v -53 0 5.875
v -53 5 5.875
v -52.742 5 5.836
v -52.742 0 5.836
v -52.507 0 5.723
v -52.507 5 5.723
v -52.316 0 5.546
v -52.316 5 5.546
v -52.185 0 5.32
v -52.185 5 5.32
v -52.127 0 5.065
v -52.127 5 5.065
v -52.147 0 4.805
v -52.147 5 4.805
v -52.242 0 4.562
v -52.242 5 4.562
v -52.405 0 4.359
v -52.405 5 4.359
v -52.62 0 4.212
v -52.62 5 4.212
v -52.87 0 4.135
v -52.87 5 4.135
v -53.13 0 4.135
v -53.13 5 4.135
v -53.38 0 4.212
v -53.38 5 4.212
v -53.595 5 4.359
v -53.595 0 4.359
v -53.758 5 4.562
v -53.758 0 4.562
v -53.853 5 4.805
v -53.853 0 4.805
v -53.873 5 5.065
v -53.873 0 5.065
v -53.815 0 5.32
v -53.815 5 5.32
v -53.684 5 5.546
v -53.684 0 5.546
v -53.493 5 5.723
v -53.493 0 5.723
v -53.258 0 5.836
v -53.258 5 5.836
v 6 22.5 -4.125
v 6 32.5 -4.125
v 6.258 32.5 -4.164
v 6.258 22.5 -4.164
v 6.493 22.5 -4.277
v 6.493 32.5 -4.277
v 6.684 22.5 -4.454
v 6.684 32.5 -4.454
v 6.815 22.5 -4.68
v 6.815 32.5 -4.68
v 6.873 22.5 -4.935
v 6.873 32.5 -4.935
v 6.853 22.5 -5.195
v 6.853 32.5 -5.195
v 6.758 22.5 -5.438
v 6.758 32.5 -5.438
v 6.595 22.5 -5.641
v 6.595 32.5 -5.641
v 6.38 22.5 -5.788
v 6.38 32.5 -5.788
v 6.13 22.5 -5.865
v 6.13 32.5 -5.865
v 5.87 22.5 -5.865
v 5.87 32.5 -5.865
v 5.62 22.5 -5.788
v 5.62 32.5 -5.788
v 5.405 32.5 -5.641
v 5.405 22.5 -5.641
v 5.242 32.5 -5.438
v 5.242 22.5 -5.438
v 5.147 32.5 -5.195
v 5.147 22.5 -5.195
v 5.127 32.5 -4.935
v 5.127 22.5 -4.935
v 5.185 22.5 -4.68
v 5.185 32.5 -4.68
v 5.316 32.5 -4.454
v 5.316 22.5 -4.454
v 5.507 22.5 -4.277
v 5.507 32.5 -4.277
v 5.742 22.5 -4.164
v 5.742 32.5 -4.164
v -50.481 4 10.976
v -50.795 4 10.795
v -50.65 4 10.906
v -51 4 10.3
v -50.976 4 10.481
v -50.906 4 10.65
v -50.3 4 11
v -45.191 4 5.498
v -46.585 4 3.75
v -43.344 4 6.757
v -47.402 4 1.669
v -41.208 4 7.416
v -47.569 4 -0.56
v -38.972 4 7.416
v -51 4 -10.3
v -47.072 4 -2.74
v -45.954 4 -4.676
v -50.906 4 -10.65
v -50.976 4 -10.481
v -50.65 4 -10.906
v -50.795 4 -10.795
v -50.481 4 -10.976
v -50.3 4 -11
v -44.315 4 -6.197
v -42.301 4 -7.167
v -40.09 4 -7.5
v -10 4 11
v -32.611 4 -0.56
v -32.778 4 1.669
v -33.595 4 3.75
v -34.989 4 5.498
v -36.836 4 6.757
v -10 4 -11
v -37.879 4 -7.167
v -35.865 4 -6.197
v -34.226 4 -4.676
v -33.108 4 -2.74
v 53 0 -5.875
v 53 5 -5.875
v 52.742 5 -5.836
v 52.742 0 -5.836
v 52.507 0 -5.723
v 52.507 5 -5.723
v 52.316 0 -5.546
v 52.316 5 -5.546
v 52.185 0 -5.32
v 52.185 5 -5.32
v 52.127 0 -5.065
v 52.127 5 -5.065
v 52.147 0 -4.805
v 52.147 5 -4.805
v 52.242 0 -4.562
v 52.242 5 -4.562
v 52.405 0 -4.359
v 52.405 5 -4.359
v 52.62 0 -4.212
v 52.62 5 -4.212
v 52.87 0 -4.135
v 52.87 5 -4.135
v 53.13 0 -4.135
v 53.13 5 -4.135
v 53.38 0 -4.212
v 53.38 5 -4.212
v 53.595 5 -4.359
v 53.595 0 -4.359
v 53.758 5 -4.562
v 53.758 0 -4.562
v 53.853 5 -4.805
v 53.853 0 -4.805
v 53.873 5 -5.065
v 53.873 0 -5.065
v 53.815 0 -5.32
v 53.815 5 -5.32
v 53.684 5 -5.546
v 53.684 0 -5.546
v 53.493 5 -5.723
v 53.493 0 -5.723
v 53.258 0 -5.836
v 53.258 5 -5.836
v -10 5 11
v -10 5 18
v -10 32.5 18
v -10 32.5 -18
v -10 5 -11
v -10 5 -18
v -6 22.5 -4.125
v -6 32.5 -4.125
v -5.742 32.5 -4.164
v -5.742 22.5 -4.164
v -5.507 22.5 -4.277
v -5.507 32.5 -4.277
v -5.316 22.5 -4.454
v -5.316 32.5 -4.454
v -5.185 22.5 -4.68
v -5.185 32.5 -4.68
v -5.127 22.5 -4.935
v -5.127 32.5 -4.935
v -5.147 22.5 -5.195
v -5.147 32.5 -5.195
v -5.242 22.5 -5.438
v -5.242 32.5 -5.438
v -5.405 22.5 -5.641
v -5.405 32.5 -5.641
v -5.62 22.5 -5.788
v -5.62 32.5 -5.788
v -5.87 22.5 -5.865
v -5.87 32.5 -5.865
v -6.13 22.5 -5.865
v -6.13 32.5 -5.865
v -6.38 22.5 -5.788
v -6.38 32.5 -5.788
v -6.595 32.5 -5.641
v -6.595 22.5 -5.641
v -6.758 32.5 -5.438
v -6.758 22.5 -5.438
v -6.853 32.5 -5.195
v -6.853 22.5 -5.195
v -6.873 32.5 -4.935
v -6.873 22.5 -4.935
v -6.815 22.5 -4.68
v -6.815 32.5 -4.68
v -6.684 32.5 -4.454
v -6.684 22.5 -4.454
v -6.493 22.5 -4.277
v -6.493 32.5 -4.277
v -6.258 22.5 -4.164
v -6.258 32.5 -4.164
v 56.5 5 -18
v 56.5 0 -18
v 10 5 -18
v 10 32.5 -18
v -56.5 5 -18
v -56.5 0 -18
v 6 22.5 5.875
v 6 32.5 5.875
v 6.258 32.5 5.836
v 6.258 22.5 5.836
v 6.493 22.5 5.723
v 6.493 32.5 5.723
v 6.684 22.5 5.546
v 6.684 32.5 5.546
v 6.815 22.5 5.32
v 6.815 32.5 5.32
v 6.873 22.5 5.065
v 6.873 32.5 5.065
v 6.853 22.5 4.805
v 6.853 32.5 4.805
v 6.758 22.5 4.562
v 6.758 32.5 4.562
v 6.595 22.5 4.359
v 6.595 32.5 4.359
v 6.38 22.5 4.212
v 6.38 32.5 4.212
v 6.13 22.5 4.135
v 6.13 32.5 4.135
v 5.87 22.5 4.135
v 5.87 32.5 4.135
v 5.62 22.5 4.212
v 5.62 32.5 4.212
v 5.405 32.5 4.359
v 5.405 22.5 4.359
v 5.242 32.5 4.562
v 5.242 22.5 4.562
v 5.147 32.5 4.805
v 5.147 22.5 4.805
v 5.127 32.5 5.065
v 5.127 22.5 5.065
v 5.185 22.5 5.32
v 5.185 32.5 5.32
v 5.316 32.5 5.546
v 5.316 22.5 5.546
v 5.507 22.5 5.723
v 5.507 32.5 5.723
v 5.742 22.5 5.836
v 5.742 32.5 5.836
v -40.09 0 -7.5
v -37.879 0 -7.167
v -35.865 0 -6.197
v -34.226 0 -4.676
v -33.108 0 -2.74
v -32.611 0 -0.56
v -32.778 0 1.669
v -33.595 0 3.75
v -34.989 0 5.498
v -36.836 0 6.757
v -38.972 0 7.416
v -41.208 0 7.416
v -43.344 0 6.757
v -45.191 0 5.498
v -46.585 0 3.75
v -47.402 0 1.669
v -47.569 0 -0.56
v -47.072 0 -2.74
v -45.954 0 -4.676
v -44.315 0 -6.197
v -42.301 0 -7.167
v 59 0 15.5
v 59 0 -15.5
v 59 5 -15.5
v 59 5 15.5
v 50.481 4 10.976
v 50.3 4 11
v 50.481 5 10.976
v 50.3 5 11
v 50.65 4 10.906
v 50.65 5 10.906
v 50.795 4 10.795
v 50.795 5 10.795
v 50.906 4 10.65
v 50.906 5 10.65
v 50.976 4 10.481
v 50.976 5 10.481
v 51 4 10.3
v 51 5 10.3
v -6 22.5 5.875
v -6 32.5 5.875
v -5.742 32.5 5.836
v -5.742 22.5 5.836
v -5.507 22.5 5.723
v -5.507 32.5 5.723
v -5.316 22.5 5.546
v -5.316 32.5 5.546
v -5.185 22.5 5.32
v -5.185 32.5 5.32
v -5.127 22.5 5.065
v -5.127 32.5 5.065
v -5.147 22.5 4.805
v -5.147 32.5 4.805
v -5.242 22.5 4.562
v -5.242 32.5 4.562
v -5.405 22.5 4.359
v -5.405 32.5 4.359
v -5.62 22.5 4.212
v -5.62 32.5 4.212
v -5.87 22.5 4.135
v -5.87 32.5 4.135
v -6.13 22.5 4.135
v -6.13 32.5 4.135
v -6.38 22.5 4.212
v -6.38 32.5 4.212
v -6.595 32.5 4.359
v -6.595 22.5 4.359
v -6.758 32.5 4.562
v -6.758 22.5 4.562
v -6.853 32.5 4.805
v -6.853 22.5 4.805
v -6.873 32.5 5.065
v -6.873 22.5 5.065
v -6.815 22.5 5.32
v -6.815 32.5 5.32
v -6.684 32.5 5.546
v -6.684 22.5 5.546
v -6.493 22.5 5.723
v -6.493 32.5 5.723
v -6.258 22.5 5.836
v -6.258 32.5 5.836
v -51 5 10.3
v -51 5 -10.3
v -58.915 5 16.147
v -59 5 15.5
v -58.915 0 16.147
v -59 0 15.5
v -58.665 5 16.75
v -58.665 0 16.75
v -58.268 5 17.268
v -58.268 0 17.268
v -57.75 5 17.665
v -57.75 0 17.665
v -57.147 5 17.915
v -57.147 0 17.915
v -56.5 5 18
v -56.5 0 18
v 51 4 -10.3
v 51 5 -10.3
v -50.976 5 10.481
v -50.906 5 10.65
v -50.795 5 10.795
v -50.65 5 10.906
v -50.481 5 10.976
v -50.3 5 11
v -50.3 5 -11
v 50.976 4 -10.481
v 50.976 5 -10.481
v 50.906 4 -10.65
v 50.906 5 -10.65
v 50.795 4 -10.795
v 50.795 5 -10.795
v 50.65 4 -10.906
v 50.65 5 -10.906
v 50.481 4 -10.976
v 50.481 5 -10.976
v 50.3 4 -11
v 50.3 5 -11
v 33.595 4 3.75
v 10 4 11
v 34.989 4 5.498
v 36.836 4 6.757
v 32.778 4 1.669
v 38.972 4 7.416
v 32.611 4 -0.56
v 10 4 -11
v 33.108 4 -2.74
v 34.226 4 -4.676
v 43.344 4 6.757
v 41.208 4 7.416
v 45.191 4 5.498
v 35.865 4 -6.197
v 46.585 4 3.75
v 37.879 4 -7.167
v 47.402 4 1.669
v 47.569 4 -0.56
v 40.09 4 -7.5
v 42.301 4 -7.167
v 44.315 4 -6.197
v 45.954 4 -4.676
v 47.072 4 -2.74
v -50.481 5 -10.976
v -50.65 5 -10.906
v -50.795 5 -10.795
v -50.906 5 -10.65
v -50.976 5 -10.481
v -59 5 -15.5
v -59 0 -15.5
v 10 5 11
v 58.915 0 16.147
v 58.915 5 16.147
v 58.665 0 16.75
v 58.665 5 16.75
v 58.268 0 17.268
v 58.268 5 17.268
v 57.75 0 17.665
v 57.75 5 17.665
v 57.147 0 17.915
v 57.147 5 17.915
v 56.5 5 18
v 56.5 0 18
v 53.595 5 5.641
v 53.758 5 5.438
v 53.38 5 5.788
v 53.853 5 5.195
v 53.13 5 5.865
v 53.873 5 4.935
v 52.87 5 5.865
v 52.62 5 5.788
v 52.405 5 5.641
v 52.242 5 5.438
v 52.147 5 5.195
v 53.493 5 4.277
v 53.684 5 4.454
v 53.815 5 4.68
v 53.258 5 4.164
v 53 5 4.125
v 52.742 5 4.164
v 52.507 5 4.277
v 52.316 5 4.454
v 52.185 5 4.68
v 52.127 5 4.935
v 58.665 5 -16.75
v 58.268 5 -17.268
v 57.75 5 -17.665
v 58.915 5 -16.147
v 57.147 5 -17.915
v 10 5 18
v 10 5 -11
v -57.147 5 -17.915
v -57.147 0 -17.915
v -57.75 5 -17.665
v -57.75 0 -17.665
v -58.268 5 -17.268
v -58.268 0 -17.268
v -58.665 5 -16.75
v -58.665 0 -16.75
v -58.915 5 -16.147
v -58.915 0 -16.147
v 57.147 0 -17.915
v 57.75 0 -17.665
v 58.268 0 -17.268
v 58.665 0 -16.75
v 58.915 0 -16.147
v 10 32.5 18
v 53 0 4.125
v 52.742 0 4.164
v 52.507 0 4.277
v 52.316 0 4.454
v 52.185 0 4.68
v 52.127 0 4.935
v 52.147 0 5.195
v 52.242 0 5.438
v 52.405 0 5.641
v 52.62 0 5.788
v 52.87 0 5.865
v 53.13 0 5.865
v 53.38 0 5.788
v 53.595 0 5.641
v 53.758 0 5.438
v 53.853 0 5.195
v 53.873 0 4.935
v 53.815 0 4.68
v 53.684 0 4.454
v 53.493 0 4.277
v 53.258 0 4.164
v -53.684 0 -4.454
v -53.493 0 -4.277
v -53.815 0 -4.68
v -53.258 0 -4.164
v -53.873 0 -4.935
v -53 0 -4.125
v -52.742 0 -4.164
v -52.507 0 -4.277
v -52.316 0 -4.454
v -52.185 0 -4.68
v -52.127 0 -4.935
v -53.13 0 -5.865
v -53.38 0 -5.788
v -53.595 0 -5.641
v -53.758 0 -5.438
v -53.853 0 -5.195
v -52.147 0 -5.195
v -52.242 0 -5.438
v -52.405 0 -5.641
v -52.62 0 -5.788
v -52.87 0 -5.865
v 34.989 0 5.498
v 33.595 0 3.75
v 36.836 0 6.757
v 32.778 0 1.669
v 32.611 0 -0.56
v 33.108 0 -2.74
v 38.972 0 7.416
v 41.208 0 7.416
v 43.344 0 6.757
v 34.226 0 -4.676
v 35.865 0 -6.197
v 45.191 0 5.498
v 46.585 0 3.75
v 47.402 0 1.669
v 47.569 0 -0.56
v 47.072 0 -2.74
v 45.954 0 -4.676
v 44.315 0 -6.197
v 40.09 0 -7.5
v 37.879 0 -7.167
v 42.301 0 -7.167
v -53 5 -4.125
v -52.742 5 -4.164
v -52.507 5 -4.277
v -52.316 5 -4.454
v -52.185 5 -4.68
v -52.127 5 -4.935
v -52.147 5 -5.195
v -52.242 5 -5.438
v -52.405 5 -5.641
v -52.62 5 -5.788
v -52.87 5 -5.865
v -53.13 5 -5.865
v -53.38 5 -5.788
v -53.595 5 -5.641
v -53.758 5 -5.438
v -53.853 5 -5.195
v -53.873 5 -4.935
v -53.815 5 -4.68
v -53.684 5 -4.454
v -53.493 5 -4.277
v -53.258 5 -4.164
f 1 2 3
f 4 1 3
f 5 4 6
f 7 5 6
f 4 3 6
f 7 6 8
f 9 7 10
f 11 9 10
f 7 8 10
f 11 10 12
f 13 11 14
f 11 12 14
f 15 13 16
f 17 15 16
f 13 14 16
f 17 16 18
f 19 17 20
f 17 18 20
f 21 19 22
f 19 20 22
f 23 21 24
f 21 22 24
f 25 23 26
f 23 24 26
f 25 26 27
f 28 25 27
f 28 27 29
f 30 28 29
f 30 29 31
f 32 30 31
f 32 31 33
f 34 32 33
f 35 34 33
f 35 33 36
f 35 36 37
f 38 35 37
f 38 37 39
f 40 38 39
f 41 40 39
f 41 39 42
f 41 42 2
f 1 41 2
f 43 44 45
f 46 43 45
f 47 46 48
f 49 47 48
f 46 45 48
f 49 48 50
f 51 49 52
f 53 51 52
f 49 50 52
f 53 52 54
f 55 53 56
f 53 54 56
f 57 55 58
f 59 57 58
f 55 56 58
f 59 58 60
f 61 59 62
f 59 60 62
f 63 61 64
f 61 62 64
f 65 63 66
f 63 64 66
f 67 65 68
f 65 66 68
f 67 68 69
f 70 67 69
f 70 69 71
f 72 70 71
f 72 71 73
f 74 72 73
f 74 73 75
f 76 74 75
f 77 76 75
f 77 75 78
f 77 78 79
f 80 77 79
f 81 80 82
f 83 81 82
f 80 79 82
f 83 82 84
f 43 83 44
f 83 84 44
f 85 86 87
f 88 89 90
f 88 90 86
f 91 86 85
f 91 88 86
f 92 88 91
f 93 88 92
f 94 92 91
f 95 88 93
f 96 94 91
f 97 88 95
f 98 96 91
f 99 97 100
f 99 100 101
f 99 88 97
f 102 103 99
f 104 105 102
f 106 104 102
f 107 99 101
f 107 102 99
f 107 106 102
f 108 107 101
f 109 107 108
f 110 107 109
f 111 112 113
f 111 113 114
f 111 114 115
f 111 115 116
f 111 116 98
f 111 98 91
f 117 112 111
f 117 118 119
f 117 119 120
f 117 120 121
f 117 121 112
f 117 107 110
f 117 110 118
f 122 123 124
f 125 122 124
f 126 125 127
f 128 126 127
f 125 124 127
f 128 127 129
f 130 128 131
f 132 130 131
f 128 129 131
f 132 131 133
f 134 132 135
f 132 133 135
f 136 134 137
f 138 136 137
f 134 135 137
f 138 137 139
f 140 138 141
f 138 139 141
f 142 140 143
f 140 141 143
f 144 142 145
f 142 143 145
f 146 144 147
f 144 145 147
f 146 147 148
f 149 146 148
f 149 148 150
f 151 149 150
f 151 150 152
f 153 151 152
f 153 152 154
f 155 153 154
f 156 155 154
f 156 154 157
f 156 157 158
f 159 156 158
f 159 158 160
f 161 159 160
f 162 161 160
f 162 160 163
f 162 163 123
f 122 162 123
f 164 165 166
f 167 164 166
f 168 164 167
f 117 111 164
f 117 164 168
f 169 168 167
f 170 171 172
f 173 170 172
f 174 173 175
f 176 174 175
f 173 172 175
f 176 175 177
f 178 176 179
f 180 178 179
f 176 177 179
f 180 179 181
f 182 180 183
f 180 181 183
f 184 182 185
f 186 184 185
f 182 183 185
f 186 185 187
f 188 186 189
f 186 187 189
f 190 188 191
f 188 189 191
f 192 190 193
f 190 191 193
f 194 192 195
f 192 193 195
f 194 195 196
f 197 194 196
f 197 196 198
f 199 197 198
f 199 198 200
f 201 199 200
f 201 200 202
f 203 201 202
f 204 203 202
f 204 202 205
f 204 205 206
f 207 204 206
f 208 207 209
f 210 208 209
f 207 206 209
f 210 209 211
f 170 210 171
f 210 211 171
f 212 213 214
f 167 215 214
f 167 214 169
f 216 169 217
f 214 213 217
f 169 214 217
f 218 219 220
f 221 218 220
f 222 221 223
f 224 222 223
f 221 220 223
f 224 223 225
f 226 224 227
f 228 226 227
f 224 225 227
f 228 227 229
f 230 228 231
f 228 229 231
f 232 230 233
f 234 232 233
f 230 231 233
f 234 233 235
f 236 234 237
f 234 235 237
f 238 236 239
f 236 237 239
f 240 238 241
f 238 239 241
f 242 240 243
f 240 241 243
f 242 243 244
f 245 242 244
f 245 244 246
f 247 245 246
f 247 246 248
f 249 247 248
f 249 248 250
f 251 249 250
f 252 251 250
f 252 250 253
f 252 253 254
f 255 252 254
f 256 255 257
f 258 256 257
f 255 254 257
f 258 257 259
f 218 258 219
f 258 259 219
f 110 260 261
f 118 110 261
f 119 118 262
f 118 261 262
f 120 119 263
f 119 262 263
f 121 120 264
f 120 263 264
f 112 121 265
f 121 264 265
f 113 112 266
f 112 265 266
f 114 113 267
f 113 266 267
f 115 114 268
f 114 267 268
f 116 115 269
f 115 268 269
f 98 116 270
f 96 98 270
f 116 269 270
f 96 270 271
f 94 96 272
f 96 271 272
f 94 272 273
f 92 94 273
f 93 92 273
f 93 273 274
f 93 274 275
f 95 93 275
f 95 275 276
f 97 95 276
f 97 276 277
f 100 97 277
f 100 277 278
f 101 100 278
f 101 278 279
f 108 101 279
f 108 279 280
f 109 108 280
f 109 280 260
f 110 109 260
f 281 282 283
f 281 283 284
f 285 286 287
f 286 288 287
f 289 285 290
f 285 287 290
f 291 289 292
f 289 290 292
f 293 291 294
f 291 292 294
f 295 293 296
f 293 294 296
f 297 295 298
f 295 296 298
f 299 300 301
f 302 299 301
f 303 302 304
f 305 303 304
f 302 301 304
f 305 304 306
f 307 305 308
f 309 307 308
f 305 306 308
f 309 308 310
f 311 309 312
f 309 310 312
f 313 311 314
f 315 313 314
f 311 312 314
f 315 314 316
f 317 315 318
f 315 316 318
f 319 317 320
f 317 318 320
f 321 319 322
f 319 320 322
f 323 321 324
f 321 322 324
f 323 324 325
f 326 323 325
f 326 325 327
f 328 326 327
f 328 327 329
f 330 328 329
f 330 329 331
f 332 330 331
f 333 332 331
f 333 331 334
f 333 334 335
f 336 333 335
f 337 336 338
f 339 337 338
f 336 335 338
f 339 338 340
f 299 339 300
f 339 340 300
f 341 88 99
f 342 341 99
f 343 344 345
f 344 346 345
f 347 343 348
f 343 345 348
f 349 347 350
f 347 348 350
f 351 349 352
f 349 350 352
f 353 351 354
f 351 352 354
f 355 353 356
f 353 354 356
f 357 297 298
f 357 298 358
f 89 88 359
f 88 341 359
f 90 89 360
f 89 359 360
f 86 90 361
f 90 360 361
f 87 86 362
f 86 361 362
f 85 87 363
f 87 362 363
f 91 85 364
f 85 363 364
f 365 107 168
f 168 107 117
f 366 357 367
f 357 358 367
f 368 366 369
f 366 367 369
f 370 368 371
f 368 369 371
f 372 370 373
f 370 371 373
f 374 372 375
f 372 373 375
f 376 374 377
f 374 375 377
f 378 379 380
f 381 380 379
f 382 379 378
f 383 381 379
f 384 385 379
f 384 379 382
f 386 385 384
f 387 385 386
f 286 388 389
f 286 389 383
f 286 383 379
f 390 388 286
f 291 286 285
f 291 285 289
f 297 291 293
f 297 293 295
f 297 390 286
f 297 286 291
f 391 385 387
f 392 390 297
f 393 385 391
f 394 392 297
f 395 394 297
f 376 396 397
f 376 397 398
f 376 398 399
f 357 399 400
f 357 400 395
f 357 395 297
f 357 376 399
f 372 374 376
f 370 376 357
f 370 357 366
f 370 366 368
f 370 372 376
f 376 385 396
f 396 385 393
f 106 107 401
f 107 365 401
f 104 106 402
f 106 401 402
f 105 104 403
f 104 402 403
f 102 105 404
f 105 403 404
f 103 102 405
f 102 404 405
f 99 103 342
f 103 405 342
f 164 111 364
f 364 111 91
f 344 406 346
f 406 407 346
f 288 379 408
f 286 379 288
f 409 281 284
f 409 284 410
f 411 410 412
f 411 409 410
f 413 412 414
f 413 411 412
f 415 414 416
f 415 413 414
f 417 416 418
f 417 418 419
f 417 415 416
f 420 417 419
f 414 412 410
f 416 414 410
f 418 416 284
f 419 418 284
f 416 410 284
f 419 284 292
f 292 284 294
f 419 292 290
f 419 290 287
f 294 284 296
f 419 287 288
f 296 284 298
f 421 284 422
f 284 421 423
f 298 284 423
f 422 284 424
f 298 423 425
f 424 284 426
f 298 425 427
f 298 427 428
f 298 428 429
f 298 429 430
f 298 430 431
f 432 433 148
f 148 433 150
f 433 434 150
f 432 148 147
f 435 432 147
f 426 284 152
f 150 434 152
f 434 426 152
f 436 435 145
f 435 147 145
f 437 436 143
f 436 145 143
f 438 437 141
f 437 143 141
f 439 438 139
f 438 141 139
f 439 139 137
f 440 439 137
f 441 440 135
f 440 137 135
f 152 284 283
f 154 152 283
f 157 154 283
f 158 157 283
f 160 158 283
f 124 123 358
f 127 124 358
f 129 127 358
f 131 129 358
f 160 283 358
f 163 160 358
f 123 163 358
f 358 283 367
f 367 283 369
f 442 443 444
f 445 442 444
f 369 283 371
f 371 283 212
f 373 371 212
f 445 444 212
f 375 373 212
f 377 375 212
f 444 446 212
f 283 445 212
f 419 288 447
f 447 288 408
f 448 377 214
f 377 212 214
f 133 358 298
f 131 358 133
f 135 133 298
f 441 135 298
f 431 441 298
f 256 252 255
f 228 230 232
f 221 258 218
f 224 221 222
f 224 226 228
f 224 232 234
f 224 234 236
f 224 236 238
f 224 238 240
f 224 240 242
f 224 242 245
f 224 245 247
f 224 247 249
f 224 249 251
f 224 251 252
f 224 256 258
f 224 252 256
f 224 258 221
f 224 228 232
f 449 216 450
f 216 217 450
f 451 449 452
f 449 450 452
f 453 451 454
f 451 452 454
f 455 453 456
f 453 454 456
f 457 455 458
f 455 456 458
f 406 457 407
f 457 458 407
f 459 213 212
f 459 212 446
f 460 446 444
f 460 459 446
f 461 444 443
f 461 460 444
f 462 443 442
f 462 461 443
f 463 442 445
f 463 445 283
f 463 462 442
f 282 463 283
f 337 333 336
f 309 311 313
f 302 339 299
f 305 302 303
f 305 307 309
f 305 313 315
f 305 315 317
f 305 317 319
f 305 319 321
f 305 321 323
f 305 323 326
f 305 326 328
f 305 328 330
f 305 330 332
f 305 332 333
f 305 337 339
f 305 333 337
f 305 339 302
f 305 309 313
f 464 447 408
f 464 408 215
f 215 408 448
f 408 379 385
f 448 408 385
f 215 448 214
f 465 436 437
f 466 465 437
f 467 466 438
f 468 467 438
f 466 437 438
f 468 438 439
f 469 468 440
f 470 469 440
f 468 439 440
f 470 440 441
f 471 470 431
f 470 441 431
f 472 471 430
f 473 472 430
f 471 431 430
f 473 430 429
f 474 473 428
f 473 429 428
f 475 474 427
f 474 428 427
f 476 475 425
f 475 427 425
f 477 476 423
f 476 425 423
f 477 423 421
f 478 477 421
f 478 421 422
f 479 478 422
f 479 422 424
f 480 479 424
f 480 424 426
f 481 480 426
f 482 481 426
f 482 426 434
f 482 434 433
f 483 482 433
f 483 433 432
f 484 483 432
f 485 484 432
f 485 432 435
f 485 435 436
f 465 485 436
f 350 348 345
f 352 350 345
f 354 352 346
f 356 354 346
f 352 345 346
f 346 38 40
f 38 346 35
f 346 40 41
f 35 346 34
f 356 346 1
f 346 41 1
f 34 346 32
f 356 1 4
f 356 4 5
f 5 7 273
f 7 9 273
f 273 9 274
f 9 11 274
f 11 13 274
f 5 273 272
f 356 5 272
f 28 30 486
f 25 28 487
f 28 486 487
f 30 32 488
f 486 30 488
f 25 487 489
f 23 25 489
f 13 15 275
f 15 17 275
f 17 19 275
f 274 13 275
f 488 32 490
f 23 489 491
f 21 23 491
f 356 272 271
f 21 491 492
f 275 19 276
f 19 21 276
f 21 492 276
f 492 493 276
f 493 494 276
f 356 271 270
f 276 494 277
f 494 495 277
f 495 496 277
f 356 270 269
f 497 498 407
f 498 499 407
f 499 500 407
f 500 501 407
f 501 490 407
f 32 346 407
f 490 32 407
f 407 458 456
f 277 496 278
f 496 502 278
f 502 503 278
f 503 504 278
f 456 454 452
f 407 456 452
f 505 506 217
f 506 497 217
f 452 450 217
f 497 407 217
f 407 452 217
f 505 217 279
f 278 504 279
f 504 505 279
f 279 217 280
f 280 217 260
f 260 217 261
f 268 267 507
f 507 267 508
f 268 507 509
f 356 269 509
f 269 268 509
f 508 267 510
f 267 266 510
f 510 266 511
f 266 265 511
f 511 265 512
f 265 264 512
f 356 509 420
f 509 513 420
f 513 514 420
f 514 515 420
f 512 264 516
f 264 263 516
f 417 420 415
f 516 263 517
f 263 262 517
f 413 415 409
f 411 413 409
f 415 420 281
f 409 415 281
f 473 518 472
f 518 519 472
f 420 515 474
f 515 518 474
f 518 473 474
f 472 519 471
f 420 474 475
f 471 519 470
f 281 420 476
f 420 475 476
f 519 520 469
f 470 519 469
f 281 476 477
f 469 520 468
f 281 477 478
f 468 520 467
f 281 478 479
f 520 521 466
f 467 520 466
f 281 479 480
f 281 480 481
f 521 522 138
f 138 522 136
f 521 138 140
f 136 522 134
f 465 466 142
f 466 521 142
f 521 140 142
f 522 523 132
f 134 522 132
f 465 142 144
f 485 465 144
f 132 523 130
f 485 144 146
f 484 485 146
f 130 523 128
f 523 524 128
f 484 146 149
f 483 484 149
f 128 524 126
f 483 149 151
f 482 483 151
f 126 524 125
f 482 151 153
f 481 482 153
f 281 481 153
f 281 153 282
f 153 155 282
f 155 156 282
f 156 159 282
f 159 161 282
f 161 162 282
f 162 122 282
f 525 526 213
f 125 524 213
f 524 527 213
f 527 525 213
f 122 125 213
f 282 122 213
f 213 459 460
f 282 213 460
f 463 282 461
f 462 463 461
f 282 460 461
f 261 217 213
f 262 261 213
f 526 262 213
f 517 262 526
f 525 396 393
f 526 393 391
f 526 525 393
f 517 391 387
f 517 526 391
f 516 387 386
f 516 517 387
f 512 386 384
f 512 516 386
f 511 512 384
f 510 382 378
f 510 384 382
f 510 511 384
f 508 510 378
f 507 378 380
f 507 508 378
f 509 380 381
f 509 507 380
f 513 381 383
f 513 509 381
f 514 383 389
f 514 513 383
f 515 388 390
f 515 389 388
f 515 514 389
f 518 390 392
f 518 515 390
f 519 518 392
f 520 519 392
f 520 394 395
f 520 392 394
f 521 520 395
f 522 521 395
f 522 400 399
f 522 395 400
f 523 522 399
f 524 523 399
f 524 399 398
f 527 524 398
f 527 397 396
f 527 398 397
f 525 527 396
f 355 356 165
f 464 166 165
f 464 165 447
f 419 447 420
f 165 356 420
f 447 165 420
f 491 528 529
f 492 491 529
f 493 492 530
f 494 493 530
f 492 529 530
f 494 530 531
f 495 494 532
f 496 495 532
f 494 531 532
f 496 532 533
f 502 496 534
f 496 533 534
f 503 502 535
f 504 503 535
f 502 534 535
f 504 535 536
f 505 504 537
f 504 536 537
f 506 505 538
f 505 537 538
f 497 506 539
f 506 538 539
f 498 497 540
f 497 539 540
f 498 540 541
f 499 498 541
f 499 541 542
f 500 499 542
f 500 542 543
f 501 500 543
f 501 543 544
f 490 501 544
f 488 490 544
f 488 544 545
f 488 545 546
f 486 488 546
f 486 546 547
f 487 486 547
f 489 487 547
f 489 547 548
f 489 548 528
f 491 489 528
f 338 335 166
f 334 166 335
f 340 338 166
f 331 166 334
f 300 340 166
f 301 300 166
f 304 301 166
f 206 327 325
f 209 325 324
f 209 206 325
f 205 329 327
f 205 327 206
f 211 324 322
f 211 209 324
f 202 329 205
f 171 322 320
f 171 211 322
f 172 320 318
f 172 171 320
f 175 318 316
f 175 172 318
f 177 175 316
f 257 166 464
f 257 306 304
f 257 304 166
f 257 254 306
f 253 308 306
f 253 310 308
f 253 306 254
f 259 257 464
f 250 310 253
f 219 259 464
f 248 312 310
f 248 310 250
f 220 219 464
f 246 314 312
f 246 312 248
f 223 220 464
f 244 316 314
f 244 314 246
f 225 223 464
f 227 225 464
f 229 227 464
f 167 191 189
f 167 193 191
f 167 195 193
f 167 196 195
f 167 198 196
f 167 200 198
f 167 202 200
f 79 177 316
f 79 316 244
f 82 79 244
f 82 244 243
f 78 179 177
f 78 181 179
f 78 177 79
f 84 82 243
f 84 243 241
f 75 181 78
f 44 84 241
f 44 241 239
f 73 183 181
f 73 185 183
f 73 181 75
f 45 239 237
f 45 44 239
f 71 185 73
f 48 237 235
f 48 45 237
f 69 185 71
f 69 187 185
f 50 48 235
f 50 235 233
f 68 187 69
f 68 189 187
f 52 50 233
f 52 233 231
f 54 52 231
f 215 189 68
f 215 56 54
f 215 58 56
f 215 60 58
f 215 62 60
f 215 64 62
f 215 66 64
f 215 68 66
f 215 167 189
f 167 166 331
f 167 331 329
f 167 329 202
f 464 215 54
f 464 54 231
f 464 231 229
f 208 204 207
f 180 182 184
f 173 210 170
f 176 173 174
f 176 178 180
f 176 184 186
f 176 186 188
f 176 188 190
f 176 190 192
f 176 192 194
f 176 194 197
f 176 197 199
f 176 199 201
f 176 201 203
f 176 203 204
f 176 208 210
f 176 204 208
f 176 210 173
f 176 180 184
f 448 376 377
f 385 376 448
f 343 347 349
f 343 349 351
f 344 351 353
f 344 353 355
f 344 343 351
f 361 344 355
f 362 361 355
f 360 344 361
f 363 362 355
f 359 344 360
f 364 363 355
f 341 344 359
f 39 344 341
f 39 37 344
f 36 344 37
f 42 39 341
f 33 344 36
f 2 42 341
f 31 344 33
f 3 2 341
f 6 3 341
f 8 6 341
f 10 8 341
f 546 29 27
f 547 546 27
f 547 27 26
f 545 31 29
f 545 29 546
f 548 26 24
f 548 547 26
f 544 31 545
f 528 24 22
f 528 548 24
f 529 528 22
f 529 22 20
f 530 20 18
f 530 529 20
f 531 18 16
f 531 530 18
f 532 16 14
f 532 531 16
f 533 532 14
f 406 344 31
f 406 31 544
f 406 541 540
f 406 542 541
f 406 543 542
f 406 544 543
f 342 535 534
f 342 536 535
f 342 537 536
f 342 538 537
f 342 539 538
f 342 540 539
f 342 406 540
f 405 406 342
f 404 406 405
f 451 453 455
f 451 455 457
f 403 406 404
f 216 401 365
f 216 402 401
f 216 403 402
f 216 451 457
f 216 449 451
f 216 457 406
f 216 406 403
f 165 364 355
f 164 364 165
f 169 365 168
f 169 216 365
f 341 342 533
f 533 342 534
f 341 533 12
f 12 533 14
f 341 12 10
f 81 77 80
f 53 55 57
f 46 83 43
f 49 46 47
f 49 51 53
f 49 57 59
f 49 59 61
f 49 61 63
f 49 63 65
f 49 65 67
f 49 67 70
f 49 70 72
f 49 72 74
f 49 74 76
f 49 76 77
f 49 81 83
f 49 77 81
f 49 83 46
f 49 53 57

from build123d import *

# Parameters (mm, degrees)
SKETCH1_W            = 20
SKETCH1_H            = 36
BOSS_EXTRUDE1_DEPTH  = 4
SKETCH2_W            = 20
SKETCH2_H            = 36
BOSS_EXTRUDE2_DEPTH  = 28.5
BOSS_EXTRUDE3_DEPTH  = 1
FILLET1_R            = 0.7
FILLET3_R            = 0.7
FILLET3_OF_MIRROR3_R = 0.7
FILLET4_R            = 0.7
SKETCH14_R           = 0.875
CUT_EXTRUDE3_DEPTH   = 68.537026882
SKETCH16_R           = 7.5
CUT_EXTRUDE4_DEPTH   = 10
SKETCH18_R           = 0.875
CUT_EXTRUDE5_DEPTH   = 10


with BuildPart() as part:
    # Sketch1 → Boss-Extrude1 (new body)
    with BuildSketch(Plane(origin=(0, 0, 0), x_dir=(1, 0, 0), z_dir=(0, 1, 0))):
        with BuildLine():
            Line((-10, -18), (-10, 18))
            Line((-10, 18), (-56.5, 18))
            ThreePointArc((-56.5, 18), (-58.267766953, 17.267766953), (-59, 15.5))
            Line((-59, 15.5), (-59, -15.5))
            ThreePointArc((-59, -15.5), (-58.267766953, -17.267766953), (-56.5, -18))
            Line((-56.5, -18), (-10, -18))
        make_face()
        Rectangle(SKETCH1_W, SKETCH1_H)
        with BuildLine():
            ThreePointArc((59, 15.5), (58.267766953, 17.267766953), (56.5, 18))
            Line((56.5, 18), (10, 18))
            Line((10, 18), (10, -18))
            Line((10, -18), (56.5, -18))
            ThreePointArc((56.5, -18), (58.267766953, -17.267766953), (59, -15.5))
            Line((59, -15.5), (59, 15.5))
        make_face()
    extrude(amount=BOSS_EXTRUDE1_DEPTH)

    # Sketch2 → Boss-Extrude2 (add)
    with BuildSketch(Plane(origin=(0, 4, 0), x_dir=(1, 0, 0), z_dir=(0, 1, 0))):
        Rectangle(SKETCH2_W, SKETCH2_H)
    extrude(amount=BOSS_EXTRUDE2_DEPTH)

    # Sketch7 → Boss-Extrude3 (add)
    with BuildSketch(Plane(origin=(0, 4, 0), x_dir=(1, 0, 0), z_dir=(0, 1, 0))):
        with BuildLine():
            Line((-51, 11), (-10, 11))
            Line((-10, 11), (-10, 18))
            Line((-10, 18), (-56.5, 18))
            ThreePointArc((-56.5, 18), (-58.267766953, 17.267766953), (-59, 15.5))
            Line((-59, 15.5), (-59, -15.5))
            ThreePointArc((-59, -15.5), (-58.267766953, -17.267766953), (-56.5, -18))
            Line((-56.5, -18), (-10, -18))
            Line((-10, -18), (-10, -11))
            Line((-10, -11), (-51, -11))
            Line((-51, -11), (-51, 11))
        make_face()
    boss_extrude3 = extrude(amount=BOSS_EXTRUDE3_DEPTH)

    # Fillet1
    fillet1_edges = [part.edges().sort_by_distance(p)[0] for p in [
        (-51, 4.5, -11),
    ]]
    fillet(fillet1_edges, radius=FILLET1_R)

    # Fillet3
    fillet3_edges = [part.edges().sort_by_distance(p)[0] for p in [
        (-51, 4.5, 11),
    ]]
    fillet(fillet3_edges, radius=FILLET3_R)

    # Mirror3: Boss-Extrude3 across plane
    add(boss_extrude3.mirror(Plane(origin=(0, 0, 0), x_dir=(0, 0, 1), z_dir=(1, 0, 0))))

    # Fillet3 of Mirror3
    fillet3_of_mirror3_edges = [part.edges().sort_by_distance(p)[0] for p in [
        (51, 4.5, 11),
    ]]
    fillet(fillet3_of_mirror3_edges, radius=FILLET3_OF_MIRROR3_R)

    # Fillet4
    fillet4_edges = [part.edges().sort_by_distance(p)[0] for p in [
        (51, 4.5, -11),
    ]]
    fillet(fillet4_edges, radius=FILLET4_R)

    # Sketch14 → Cut-Extrude3 (cut, through all)
    with BuildSketch(Plane(origin=(0, 5, 0), x_dir=(1, 0, 0), z_dir=(0, 1, 0))):
        with Locations(Location((-53, -5, 0), (0, 0, 270))):
            Circle(SKETCH14_R)
        with Locations(Location((-53, 5, 0), (0, 0, 270))):
            Circle(SKETCH14_R)
        with Locations(Location((53, -5, 0), (0, 0, 90))):
            Circle(SKETCH14_R)
        with Locations(Location((53, 5, 0), (0, 0, 90))):
            Circle(SKETCH14_R)
    extrude(amount=-CUT_EXTRUDE3_DEPTH, mode=Mode.SUBTRACT)

    # Sketch16 → Cut-Extrude4 (cut)
    with BuildSketch(Plane.XZ):
        with Locations(Location((-40.09, 0, 0), (0, 0, 270))):
            Circle(SKETCH16_R)
    cut_extrude4 = extrude(amount=-CUT_EXTRUDE4_DEPTH, mode=Mode.SUBTRACT)

    # Mirror4: Cut-Extrude4 across plane
    add(cut_extrude4.mirror(Plane.ZY), mode=Mode.SUBTRACT)

    # Sketch18 → Cut-Extrude5 (cut)
    with BuildSketch(Plane(origin=(0, 32.5, 0), x_dir=(1, 0, 0), z_dir=(0, 1, 0))):
        with Locations(Location((-6, -5, 0), (0, 0, 270))):
            Circle(SKETCH18_R)
        with Locations(Location((-6, 5, 0), (0, 0, 270))):
            Circle(SKETCH18_R)
        with Locations(Location((6, 5, 0), (0, 0, 270))):
            Circle(SKETCH18_R)
        with Locations(Location((6, -5, 0), (0, 0, 270))):
            Circle(SKETCH18_R)
    extrude(amount=-CUT_EXTRUDE5_DEPTH, mode=Mode.SUBTRACT)


solid = part.part
